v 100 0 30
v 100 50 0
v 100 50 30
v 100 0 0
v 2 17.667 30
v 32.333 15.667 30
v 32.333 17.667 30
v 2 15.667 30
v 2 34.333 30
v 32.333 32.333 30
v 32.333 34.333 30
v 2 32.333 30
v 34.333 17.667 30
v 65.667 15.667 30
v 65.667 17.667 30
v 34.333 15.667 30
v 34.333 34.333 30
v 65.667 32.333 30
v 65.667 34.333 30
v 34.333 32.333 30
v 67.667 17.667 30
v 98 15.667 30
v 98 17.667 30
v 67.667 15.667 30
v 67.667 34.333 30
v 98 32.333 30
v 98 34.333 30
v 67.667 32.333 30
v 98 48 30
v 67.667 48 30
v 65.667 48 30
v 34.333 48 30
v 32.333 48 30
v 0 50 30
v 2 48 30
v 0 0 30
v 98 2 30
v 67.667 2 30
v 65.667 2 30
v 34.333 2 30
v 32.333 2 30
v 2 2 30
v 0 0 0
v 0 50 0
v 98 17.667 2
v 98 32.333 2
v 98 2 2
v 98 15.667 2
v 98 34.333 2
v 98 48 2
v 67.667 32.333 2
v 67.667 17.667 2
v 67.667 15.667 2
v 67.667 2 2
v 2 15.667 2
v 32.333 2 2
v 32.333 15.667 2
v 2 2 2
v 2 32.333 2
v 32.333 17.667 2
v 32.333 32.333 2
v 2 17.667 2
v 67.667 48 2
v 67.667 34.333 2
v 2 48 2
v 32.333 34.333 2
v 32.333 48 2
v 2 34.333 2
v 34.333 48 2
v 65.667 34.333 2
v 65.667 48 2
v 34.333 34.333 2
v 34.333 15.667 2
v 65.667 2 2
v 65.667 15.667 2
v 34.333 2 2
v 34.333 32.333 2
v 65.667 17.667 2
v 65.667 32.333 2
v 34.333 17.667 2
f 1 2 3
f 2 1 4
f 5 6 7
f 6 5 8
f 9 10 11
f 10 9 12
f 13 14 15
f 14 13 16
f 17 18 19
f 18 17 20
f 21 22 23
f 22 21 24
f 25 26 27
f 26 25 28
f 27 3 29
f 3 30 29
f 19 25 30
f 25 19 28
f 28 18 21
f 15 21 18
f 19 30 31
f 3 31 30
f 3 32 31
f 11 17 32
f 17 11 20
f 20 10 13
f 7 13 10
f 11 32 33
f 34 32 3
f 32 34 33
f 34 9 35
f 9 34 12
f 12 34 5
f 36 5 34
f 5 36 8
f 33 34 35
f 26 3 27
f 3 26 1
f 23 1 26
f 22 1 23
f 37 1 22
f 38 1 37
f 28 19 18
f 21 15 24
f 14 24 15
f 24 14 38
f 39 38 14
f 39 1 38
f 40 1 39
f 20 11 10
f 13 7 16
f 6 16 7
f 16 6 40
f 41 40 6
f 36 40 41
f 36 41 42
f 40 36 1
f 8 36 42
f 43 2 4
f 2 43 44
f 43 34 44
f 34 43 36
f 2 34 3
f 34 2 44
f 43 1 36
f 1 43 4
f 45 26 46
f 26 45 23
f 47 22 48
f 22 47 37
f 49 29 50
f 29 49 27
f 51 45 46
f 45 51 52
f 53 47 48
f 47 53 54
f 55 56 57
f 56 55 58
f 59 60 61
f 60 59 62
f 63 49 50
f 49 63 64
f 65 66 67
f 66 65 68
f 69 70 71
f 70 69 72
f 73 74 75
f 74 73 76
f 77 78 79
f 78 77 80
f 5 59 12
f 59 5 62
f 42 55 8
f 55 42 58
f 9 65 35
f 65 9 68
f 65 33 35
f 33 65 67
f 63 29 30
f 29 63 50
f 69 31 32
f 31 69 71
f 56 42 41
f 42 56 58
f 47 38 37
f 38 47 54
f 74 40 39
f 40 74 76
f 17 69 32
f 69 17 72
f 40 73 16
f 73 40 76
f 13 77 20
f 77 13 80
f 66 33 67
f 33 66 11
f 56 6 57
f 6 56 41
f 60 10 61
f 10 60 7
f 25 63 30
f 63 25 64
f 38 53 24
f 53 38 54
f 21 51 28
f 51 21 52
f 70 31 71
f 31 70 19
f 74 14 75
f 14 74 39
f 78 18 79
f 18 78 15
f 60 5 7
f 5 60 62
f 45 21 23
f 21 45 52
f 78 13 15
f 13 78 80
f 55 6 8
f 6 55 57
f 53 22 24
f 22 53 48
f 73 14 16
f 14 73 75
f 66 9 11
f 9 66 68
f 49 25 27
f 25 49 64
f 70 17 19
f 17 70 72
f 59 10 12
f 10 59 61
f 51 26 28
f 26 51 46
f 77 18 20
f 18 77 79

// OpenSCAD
/* [Settings:] */

// Thickness of the walls in mm
wall_thickness = 2; // [1,2,3,4,5]

/* [Dimensions:] */

// Length of the compartment in mm
length = 100;

// Width of the compartment in mm
width = 50;

// Height of the compartment in mm
height = 30;

/* [Compartments:] */

// Vertical dividers (columns)
columns = 2; // [0:10]

// Horizontal dividers (rows)
rows = 2; // [0:10]

module compartment()
{
	// Create the outer shell of the box
	difference()
	{
		// Outer box
		cube([ length, width, height ]);

		// Create the inner void
		translate([ wall_thickness, wall_thickness, wall_thickness ])
		cube(
		    [ length - 2 * wall_thickness, width - 2 * wall_thickness, height - wall_thickness ]); // Subtract inner box
	}

	// Add column dividers if columns > 0
	if (columns > 0)
	{
		for (i = [1:columns])
		{
			translate([ (length / (columns + 1)) * i - (wall_thickness / 2), wall_thickness, wall_thickness ])
			cube([ wall_thickness, width - 2 * wall_thickness, height - wall_thickness ]);
		}
	}

	// Add row dividers if rows > 0
	if (rows > 0)
	{
		for (j = [1:rows])
		{
			translate([ wall_thickness, (width / (rows + 1)) * j - (wall_thickness / 2), wall_thickness ])
			cube([ length - 2 * wall_thickness, wall_thickness, height - wall_thickness ]);
		}
	}
}

// Call the module to render the compartment with dividers
compartment();
